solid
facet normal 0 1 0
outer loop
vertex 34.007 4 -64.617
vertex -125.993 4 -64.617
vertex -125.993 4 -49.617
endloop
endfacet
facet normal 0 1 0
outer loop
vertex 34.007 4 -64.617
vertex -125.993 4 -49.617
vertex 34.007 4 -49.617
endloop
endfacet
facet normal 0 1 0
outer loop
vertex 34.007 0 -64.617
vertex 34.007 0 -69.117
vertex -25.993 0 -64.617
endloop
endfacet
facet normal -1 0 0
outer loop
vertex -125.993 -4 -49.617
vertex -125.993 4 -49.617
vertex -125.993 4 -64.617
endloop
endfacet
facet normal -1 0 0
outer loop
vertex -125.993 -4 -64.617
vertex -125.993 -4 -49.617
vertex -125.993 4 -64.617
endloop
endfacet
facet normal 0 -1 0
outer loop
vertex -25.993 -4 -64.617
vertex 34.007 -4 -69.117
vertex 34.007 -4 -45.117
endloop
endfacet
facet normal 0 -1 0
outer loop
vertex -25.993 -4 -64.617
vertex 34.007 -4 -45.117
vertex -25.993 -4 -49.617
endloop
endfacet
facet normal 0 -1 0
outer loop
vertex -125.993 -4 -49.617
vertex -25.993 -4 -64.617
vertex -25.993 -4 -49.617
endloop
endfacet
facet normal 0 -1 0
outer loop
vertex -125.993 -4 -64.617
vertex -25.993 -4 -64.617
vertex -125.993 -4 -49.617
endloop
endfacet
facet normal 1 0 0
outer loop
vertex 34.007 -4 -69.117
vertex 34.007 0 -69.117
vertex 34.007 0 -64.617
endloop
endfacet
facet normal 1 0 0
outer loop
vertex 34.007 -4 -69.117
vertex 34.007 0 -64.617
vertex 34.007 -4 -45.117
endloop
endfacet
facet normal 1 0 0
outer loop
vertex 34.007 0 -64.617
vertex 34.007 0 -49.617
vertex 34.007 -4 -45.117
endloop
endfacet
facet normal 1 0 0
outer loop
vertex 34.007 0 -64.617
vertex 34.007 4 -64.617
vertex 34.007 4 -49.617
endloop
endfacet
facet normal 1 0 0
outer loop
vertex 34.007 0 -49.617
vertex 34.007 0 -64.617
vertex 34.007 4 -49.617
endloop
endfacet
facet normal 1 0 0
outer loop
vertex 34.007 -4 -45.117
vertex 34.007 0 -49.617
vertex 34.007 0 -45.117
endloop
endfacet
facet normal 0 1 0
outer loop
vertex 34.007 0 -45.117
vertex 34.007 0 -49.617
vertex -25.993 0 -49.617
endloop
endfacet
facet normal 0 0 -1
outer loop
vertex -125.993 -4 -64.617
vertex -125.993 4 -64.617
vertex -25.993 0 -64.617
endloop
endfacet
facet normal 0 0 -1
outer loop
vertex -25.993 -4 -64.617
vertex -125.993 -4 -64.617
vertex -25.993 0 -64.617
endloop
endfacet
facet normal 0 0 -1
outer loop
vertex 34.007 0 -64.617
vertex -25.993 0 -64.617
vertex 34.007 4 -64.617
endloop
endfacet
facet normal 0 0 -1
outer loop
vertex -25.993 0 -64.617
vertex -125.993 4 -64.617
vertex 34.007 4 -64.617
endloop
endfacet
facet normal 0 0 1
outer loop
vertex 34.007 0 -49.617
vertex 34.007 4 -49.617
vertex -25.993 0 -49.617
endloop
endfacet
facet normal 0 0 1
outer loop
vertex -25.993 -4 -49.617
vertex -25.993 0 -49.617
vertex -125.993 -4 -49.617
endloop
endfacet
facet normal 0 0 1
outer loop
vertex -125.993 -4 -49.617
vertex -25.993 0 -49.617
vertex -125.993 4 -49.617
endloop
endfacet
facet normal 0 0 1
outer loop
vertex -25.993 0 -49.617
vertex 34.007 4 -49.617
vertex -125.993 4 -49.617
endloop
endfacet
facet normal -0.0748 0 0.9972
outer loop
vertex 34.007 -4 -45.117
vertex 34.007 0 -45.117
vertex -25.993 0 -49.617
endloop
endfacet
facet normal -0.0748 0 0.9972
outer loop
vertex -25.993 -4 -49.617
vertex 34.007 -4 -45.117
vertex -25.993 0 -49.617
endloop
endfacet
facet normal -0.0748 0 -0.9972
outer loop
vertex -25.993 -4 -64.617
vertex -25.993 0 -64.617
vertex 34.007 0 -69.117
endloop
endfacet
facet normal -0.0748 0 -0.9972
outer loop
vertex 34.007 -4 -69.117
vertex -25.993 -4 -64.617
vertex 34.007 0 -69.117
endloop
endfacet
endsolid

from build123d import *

# Parameters (mm, degrees)
SKETCH1_W           = 160
SKETCH1_H           = 15
BOSS_EXTRUDE1_DEPTH = 4
BOSS_EXTRUDE2_DEPTH = 4


with BuildPart() as part:
    # Sketch1 → Boss-Extrude1 (new body)
    with BuildSketch(Plane(origin=(0, 0, 0), x_dir=(1, 0, 0), z_dir=(0, 1, 0))):
        with Locations((-45.993031359, 57.116724739)):
            Rectangle(SKETCH1_W, SKETCH1_H)
    extrude(amount=BOSS_EXTRUDE1_DEPTH)

    # Sketch2 → Boss-Extrude2 (add)
    with BuildSketch(Plane(origin=(0, 0, 0), x_dir=(1, 0, 0), z_dir=(0, 1, 0))):
        Polygon((-125.993031359, 64.616724739), (-25.993031359, 64.616724739), (34.006968641, 69.116724739), (34.006968641, 45.116724739), (-25.993031359, 49.616724739), (-125.993031359, 49.616724739), align=None)
    extrude(amount=-BOSS_EXTRUDE2_DEPTH)


solid = part.part
